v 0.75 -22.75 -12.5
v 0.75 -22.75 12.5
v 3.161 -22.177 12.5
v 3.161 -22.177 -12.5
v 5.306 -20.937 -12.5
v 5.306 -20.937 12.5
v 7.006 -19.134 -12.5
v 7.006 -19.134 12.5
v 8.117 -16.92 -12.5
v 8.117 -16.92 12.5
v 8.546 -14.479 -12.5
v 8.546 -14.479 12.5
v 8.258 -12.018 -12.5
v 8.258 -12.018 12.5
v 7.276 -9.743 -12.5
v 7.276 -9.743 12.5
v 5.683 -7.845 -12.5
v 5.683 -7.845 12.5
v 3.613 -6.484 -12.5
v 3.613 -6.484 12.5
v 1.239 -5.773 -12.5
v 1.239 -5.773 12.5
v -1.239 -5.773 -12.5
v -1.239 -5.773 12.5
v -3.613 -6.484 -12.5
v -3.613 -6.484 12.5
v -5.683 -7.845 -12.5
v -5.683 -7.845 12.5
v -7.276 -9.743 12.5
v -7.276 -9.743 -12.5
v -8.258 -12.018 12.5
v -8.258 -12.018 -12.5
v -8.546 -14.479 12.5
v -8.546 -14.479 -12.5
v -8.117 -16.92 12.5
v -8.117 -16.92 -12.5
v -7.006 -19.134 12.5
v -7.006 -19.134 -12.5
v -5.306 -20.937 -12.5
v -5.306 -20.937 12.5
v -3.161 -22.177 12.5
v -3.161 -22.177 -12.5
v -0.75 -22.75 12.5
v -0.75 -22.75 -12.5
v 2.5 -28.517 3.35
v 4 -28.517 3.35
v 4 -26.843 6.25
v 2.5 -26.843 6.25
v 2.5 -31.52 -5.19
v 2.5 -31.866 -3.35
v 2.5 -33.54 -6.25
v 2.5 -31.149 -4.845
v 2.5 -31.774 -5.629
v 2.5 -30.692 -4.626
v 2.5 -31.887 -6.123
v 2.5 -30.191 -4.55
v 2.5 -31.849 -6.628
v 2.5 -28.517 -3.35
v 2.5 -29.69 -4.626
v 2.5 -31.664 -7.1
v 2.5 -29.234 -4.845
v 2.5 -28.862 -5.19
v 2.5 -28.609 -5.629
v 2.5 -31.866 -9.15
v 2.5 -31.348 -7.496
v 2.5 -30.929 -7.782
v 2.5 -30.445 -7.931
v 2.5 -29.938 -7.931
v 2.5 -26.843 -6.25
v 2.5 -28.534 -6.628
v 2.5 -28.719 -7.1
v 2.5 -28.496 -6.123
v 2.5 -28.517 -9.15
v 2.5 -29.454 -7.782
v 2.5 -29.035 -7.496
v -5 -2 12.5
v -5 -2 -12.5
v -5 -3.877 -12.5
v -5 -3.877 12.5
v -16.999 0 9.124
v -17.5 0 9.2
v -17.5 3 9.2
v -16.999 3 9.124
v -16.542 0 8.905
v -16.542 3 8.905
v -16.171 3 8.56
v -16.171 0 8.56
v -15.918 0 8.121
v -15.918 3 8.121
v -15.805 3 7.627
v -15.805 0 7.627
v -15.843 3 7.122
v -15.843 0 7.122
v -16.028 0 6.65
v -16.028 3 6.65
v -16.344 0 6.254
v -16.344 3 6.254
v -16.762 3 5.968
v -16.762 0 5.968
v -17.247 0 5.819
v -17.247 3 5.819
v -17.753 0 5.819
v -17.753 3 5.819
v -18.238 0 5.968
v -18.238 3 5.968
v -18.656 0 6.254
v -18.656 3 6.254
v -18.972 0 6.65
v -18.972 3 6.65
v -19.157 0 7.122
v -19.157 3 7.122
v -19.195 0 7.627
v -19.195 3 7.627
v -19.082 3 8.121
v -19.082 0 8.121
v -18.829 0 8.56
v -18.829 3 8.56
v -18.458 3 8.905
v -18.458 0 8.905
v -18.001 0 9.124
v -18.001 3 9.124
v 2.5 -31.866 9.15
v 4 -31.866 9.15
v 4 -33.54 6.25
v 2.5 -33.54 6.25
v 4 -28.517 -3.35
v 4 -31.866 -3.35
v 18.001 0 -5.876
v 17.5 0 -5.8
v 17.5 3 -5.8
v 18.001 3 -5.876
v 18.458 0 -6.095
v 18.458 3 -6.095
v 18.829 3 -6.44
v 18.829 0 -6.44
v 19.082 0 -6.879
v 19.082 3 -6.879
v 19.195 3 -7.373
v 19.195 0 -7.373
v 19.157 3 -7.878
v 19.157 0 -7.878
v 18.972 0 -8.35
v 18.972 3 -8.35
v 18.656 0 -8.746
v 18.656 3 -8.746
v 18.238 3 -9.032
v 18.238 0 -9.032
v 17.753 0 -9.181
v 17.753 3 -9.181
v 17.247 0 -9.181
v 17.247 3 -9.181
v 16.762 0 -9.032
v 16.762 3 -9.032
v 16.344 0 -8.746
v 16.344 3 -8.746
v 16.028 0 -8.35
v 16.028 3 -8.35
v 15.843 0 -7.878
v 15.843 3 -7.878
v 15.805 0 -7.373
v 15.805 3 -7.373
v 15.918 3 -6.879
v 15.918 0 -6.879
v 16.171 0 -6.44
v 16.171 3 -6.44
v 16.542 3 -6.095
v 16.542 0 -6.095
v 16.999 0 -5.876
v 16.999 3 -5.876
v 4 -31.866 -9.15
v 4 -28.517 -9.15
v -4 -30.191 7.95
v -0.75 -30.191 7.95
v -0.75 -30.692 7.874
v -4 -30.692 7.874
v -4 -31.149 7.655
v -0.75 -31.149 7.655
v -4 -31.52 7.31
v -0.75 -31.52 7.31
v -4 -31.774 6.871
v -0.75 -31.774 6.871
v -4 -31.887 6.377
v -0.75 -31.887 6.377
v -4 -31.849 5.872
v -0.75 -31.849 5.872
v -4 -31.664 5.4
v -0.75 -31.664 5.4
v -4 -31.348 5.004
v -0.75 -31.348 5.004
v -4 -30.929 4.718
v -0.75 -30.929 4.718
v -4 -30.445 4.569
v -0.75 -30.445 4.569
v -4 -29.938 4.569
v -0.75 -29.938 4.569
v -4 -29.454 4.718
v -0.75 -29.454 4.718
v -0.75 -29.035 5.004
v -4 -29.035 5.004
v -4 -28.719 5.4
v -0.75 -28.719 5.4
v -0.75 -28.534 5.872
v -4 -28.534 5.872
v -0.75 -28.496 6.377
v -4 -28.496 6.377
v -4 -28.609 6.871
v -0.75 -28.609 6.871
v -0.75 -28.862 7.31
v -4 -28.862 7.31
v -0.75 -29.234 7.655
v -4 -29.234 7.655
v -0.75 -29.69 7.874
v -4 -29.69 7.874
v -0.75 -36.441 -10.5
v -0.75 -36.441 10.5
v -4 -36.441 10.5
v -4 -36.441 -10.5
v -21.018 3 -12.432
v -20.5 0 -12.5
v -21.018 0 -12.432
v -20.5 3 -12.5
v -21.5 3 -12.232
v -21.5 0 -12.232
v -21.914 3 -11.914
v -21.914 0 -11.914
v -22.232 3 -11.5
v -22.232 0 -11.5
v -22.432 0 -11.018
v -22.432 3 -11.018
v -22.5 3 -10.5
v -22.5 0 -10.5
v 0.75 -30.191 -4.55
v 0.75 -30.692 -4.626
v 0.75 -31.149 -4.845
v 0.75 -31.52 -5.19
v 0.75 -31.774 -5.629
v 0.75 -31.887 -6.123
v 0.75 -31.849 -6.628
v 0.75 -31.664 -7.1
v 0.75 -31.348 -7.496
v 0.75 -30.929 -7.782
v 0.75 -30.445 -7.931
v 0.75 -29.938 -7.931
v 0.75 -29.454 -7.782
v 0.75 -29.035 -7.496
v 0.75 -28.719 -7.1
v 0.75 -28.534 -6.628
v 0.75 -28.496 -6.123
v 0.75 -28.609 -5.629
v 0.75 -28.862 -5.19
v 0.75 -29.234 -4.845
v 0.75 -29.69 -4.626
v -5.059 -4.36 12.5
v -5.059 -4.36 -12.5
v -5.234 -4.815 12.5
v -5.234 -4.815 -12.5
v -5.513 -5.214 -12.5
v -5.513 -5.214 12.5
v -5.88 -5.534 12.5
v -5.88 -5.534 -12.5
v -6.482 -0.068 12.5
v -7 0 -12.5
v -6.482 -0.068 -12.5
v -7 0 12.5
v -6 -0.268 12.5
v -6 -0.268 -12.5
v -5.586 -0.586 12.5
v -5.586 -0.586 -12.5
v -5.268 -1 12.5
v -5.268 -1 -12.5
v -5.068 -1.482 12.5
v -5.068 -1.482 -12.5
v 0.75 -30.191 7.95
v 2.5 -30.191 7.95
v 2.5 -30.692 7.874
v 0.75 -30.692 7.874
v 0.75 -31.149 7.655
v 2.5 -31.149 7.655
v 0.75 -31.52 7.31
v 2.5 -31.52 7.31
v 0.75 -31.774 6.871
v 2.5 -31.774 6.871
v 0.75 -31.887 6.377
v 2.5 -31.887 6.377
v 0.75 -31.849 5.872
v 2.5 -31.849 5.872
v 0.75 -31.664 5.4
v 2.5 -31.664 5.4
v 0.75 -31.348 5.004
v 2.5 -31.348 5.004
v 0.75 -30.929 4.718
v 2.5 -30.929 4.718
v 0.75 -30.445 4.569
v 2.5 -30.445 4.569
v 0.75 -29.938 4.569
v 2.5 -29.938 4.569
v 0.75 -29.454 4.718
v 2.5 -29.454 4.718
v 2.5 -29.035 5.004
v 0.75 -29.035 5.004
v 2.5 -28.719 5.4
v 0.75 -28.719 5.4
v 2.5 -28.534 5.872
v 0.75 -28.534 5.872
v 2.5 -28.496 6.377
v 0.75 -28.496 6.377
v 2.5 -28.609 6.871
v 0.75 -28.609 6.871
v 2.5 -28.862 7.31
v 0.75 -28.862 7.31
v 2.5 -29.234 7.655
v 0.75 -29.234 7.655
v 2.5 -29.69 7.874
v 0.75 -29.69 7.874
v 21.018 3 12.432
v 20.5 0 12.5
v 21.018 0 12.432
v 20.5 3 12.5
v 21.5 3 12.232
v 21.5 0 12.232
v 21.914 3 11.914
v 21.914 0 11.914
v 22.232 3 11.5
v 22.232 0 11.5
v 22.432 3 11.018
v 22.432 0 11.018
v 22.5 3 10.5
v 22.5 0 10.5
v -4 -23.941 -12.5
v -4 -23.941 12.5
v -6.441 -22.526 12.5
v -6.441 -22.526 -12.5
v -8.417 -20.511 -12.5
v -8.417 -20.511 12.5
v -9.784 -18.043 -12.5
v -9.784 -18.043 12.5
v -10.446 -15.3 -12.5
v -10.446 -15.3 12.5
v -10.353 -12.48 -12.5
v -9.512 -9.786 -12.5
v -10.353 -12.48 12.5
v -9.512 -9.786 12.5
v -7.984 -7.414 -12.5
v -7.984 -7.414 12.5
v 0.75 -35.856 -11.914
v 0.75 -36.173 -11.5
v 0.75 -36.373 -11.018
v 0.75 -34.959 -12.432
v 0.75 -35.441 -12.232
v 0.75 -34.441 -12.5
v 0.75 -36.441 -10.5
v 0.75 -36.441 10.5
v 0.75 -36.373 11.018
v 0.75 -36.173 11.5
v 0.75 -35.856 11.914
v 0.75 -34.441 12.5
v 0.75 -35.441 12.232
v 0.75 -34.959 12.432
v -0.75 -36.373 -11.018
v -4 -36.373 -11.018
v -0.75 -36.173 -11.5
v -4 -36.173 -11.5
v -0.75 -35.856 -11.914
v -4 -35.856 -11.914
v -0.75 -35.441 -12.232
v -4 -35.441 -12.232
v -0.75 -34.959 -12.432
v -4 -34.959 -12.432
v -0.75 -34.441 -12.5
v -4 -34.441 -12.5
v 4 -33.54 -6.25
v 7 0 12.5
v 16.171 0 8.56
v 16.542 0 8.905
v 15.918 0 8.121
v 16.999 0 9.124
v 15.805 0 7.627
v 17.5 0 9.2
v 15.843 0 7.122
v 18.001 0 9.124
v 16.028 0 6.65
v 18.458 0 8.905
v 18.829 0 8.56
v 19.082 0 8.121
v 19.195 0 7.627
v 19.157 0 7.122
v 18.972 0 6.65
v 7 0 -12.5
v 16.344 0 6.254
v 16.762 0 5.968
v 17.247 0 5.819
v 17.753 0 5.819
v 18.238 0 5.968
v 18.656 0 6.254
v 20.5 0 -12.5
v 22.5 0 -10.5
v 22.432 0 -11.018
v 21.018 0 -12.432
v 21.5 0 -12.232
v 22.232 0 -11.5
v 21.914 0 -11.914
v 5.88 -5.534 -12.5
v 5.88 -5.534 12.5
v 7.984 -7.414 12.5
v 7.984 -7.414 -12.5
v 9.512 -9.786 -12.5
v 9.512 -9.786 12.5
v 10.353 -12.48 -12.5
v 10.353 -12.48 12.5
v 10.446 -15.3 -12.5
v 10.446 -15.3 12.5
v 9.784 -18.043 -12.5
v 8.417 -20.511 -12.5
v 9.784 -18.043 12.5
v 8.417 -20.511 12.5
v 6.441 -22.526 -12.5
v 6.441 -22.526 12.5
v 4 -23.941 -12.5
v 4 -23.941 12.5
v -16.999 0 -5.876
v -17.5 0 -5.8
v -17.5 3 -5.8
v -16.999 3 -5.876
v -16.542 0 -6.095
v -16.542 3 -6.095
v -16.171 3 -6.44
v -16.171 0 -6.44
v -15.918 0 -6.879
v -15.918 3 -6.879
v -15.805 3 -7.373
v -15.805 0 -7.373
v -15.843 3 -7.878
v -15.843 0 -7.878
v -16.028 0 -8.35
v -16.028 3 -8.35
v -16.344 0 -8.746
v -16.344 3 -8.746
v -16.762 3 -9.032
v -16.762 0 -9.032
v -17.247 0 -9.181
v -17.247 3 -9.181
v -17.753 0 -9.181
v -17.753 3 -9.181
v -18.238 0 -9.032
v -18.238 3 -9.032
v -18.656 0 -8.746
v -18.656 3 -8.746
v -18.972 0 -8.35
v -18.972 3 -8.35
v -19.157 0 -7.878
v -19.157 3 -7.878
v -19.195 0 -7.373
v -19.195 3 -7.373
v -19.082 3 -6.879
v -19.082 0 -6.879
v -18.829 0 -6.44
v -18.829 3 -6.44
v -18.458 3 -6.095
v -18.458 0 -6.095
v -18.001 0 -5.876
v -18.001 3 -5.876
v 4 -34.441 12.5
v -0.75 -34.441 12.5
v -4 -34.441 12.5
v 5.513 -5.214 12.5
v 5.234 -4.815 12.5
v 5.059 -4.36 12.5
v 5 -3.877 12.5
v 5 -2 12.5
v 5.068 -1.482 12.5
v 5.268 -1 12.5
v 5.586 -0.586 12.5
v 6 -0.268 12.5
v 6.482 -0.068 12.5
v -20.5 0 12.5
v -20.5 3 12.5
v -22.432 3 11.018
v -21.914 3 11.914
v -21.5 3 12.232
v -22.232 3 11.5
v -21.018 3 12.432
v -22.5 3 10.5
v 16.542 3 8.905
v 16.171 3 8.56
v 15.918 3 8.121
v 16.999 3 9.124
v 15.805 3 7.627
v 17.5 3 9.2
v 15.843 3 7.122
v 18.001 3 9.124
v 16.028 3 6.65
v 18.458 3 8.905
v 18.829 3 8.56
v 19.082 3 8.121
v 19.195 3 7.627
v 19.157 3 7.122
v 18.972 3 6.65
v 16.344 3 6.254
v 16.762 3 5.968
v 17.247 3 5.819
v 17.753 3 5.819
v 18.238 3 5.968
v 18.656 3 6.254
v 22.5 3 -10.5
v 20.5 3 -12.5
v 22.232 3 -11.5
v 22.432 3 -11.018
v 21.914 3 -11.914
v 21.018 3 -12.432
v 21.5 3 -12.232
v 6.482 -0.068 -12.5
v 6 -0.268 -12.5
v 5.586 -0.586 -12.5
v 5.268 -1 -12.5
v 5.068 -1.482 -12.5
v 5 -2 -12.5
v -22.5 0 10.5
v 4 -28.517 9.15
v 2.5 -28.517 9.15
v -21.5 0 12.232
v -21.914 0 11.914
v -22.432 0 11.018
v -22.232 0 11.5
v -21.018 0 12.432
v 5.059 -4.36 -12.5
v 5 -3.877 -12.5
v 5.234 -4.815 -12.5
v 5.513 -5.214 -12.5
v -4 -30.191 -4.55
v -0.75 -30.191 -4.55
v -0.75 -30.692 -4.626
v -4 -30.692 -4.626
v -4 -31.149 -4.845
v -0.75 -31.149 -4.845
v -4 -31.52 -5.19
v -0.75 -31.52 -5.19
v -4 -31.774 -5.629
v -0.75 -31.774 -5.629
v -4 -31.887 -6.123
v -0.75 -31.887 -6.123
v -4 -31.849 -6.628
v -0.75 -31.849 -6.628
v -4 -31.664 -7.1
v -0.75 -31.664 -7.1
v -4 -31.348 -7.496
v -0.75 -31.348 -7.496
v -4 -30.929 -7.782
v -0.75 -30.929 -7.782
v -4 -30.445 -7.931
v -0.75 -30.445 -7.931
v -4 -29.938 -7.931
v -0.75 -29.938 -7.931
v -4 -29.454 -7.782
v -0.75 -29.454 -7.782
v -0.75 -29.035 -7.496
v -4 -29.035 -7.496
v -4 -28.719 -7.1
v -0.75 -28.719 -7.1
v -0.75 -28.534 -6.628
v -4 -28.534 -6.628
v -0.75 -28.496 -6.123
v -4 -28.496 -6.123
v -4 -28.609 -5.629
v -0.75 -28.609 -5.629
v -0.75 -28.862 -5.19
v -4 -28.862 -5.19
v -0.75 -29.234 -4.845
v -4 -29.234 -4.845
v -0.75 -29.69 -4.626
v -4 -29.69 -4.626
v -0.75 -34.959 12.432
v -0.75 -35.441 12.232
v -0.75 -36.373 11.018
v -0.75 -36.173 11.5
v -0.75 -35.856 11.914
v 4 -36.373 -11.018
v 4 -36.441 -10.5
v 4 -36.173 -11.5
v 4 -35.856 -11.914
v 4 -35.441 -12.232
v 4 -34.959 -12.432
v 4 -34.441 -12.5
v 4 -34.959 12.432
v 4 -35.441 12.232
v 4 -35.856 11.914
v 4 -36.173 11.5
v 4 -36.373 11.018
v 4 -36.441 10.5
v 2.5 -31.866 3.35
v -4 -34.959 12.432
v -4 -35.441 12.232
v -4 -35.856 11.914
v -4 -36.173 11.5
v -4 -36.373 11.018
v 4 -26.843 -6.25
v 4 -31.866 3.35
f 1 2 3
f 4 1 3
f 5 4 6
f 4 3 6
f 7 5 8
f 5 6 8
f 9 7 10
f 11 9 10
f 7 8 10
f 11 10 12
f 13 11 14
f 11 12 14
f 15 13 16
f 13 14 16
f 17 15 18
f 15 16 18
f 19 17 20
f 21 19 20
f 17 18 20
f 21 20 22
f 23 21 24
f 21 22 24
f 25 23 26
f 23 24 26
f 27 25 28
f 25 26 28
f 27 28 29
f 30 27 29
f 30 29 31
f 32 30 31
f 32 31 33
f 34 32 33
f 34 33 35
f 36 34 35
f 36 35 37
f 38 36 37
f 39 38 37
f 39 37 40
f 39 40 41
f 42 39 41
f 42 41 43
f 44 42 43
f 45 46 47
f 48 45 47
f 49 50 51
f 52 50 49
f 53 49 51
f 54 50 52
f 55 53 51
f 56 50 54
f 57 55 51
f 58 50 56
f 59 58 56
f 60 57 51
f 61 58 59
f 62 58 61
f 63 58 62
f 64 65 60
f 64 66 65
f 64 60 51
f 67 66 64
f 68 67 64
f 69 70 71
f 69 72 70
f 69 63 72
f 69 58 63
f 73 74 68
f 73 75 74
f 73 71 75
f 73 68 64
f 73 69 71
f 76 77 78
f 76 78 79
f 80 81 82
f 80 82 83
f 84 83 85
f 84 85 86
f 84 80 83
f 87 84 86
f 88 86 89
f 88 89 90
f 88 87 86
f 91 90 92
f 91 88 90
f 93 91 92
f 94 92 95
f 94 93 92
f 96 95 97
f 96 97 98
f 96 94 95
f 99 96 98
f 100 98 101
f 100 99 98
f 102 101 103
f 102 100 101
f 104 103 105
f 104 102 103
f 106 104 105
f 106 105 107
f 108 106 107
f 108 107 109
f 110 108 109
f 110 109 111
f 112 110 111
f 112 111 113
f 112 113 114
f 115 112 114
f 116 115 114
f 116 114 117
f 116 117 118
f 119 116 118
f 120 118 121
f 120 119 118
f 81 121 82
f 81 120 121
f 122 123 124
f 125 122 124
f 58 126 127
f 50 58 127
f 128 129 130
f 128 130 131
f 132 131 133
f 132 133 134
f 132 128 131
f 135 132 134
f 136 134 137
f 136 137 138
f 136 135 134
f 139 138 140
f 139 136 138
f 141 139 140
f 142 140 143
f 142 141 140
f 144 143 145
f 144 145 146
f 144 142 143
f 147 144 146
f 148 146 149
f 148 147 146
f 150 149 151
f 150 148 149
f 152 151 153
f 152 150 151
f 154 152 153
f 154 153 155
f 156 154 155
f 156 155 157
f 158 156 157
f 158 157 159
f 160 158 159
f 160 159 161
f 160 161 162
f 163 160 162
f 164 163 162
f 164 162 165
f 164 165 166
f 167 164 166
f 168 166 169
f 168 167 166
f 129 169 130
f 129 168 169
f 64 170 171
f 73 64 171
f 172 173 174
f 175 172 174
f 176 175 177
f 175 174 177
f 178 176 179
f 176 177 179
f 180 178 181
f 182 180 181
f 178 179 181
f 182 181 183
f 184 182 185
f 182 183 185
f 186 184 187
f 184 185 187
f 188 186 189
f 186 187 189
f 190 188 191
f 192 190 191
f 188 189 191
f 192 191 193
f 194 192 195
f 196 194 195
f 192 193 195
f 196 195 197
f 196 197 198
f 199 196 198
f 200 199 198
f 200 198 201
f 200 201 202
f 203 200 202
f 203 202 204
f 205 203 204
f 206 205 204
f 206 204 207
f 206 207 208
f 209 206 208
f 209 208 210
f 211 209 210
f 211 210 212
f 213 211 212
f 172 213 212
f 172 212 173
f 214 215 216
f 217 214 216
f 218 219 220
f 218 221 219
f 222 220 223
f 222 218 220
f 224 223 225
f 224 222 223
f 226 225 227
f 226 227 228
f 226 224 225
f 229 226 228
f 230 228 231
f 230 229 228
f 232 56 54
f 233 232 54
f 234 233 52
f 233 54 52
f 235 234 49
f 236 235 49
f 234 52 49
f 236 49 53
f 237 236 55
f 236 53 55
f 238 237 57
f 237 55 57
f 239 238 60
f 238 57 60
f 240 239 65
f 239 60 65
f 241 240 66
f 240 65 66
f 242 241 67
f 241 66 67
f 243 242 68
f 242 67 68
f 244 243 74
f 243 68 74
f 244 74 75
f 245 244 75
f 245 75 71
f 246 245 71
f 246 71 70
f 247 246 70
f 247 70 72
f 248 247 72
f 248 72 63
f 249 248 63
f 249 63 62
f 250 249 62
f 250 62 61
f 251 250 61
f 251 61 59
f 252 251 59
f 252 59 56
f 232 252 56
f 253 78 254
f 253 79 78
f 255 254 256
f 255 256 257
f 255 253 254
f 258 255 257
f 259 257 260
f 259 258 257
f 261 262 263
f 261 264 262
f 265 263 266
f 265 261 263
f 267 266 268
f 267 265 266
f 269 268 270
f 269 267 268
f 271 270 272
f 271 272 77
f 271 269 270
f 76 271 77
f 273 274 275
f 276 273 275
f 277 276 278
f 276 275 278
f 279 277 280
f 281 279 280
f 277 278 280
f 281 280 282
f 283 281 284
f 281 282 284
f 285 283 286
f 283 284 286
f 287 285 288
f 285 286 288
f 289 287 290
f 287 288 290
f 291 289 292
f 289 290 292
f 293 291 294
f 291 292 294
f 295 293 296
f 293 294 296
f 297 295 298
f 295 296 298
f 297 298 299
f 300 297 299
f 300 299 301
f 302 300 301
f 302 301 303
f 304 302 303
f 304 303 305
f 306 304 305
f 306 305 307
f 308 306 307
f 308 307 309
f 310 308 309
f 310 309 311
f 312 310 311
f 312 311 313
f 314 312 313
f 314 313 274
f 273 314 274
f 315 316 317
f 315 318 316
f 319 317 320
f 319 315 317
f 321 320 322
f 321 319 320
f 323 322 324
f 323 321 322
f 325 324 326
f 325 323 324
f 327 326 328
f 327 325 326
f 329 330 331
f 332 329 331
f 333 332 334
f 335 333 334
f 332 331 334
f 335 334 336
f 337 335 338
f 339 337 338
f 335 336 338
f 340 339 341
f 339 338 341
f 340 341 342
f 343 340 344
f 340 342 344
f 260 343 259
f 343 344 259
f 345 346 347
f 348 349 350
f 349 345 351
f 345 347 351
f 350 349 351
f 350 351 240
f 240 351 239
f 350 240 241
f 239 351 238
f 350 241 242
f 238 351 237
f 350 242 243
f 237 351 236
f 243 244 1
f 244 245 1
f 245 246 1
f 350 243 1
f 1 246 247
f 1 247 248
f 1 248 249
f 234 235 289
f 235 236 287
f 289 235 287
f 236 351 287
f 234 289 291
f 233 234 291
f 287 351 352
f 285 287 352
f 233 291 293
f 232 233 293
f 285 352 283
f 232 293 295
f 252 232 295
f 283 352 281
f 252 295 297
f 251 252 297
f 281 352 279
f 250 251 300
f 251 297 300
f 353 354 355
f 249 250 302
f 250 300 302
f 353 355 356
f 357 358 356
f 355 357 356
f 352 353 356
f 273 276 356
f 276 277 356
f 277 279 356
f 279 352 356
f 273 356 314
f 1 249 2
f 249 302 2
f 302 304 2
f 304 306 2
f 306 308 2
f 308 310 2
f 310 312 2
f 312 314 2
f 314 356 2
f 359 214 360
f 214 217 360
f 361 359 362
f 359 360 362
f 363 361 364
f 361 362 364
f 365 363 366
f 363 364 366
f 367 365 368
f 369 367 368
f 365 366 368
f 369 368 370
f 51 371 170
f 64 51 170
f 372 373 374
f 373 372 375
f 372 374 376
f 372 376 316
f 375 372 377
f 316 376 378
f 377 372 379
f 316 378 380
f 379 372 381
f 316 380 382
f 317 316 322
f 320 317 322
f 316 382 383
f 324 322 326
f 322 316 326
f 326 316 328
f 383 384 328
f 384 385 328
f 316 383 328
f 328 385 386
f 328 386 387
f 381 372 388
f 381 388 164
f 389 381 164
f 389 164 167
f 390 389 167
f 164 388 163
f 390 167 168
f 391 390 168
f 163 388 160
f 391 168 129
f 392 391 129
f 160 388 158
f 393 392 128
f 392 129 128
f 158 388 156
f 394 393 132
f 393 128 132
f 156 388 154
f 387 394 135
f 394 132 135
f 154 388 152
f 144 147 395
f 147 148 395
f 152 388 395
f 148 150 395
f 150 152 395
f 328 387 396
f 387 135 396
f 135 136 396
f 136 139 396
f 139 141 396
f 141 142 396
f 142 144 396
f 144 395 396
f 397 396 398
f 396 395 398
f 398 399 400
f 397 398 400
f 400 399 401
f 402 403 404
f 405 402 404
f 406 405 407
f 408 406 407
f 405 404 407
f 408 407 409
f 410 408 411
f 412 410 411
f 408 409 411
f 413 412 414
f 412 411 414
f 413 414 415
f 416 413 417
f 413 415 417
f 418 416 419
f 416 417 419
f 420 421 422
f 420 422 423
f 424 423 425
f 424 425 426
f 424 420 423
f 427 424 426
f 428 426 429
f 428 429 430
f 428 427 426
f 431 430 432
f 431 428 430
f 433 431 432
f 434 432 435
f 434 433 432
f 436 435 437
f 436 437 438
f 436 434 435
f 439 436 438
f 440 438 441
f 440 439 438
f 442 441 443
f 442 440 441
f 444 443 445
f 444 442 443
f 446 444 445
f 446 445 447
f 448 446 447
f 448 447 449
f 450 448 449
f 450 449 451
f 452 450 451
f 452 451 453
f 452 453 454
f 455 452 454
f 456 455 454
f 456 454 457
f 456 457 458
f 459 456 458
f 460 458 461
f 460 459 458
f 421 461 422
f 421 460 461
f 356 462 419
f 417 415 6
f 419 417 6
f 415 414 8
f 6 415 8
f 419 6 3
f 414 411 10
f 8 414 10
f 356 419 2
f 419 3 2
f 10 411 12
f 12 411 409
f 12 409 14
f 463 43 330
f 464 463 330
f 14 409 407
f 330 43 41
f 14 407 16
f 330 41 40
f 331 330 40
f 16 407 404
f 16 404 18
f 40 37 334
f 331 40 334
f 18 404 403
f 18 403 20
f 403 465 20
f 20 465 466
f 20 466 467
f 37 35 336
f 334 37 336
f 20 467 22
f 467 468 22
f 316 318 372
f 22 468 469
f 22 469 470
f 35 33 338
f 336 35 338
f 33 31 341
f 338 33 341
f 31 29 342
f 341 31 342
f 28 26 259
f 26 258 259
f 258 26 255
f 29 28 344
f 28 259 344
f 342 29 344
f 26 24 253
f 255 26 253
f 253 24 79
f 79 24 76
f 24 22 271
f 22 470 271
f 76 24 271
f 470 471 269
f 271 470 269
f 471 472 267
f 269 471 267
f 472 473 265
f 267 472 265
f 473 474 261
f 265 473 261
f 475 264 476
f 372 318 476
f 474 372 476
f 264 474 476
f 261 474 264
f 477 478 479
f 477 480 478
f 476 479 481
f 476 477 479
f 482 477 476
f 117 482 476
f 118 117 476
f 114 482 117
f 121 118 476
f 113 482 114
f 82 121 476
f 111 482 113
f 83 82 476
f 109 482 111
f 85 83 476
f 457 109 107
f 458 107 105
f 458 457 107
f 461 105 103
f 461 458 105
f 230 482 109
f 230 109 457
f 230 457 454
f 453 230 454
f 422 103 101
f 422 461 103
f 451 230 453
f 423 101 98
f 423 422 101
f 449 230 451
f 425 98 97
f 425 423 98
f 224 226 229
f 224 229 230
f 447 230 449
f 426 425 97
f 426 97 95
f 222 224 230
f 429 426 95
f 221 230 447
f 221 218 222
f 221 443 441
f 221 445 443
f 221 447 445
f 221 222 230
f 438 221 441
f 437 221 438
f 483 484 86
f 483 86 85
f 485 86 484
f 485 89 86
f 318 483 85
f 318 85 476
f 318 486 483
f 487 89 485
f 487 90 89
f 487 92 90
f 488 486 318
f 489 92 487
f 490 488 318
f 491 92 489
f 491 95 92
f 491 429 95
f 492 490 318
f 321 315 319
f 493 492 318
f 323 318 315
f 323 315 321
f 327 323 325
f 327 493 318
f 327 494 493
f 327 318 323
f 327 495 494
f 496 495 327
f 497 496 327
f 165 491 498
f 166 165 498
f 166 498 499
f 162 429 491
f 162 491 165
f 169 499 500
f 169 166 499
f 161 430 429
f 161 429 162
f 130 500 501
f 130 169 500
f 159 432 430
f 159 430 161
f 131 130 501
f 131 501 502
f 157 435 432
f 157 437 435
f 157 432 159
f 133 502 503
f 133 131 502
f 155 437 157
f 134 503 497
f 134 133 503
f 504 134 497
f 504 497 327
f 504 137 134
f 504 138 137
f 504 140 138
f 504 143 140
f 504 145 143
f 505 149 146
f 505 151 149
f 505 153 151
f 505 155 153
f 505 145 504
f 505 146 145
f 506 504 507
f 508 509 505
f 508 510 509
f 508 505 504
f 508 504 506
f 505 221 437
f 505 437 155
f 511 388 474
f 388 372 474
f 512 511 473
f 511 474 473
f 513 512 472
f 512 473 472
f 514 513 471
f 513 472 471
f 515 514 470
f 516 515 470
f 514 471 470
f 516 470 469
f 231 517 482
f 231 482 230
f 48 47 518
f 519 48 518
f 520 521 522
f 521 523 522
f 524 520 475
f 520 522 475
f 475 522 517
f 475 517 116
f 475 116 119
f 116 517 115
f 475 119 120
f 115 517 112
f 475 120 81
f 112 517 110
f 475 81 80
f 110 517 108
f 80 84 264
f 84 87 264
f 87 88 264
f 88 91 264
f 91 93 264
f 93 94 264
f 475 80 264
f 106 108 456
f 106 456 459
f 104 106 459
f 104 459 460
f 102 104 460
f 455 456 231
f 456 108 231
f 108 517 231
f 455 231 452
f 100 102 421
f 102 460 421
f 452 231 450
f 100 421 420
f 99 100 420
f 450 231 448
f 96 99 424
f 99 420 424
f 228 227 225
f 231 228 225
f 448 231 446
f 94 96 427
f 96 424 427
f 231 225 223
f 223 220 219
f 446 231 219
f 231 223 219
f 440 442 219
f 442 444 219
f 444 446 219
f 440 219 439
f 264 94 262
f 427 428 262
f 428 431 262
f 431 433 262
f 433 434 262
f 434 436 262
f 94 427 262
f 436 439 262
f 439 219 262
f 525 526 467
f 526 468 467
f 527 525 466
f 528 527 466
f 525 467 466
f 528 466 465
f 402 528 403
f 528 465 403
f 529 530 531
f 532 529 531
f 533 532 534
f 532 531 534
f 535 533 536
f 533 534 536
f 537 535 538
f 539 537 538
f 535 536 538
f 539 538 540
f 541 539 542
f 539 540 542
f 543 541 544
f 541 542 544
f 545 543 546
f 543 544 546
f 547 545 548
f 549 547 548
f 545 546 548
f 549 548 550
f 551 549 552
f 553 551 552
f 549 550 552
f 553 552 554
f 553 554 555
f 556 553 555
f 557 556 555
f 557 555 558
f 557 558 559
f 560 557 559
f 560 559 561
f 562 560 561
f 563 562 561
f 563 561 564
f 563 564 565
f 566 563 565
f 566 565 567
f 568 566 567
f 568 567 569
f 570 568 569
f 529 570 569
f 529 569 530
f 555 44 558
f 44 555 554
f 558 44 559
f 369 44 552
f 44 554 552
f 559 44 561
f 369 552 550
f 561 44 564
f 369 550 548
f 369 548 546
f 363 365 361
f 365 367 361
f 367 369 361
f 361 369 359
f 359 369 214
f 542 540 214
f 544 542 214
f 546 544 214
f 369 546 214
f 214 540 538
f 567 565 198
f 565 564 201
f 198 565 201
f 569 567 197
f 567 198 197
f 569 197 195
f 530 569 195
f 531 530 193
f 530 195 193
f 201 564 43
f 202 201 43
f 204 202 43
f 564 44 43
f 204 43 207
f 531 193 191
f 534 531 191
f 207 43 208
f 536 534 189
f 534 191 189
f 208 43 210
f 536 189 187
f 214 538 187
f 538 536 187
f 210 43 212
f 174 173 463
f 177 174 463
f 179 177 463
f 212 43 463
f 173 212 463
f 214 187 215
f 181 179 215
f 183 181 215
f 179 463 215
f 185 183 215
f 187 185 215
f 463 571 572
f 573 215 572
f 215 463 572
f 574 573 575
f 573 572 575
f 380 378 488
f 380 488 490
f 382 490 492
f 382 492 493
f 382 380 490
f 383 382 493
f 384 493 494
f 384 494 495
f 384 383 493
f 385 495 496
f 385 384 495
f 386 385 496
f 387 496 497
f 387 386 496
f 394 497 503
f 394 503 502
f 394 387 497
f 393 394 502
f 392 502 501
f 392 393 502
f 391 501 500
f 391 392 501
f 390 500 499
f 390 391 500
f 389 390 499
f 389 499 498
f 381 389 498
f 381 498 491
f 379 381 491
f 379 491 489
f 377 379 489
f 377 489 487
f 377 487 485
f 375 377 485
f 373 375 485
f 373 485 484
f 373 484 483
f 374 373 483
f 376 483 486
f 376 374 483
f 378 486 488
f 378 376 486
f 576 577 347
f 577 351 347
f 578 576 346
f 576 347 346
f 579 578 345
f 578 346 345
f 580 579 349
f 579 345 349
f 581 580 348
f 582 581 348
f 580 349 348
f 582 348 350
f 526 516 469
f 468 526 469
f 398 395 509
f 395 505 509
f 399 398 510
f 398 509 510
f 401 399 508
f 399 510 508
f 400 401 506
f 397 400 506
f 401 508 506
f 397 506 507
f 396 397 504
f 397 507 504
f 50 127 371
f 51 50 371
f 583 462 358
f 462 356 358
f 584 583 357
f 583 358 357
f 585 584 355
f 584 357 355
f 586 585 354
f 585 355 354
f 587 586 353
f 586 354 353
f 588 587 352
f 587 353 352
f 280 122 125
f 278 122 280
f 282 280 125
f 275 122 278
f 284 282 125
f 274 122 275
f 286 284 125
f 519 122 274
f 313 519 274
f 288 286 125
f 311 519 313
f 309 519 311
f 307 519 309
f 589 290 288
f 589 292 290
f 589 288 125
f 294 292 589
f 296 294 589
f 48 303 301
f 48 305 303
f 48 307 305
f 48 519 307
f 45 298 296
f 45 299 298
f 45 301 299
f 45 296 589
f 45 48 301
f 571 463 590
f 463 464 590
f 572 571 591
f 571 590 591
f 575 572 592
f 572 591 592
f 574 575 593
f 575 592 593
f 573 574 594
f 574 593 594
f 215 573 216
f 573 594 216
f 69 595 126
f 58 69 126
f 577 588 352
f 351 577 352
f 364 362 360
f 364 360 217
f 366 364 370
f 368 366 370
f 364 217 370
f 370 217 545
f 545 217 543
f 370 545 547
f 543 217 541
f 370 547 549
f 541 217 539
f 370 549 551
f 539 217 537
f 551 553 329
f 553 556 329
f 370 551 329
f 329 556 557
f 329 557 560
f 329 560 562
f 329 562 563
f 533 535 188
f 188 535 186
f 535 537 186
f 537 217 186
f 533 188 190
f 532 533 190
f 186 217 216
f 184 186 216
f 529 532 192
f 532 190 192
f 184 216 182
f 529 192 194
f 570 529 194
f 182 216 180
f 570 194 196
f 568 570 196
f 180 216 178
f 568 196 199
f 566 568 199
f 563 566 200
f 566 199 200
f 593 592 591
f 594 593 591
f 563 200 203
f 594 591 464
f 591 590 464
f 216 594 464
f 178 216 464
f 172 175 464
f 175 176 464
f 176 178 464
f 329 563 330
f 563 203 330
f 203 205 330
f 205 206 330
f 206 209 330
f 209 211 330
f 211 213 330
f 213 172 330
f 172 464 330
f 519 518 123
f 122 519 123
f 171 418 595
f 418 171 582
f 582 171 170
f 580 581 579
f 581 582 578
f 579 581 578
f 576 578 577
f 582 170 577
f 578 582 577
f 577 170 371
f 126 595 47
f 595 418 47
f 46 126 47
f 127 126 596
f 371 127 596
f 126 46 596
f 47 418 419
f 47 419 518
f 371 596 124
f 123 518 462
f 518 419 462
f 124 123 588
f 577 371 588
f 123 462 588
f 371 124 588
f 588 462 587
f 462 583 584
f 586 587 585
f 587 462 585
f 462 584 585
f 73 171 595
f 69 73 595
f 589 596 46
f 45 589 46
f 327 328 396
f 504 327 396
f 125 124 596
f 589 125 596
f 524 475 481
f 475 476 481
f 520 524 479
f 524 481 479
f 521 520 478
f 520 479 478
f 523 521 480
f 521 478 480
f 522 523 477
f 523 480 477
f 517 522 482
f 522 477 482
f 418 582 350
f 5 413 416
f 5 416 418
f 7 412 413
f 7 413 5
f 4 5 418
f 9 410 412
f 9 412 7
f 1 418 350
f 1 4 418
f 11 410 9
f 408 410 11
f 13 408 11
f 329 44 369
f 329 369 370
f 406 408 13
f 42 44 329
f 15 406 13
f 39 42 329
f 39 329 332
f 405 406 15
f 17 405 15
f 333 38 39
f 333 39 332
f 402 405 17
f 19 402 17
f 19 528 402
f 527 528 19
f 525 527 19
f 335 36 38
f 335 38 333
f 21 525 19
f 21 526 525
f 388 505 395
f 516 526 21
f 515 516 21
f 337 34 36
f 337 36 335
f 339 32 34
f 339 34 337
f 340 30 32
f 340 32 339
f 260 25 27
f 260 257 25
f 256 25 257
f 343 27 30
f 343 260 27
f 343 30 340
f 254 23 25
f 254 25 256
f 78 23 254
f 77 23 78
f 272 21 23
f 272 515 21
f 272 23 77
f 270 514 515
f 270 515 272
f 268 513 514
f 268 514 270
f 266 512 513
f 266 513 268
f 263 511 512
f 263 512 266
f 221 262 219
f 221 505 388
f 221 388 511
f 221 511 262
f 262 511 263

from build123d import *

# Parameters (mm, degrees)
SKETCH1_W           = 45
SKETCH1_H           = 25
SKETCH1_R           = 1.7
BOSS_EXTRUDE1_DEPTH = 3
SKETCH2_W           = 10
SKETCH2_H           = 25
BOSS_EXTRUDE2_DEPTH = 5
BOSS_EXTRUDE3_DEPTH = 25
CUT_EXTRUDE1_DEPTH  = 50.590533486
SKETCH5_R           = 1.7
CUT_EXTRUDE2_DEPTH  = 47.75971569
CUT_EXTRUDE3_DEPTH  = 1.5
FILLET1_R           = 2
FILLET2_R           = 2
FILLET3_R           = 2


with BuildPart() as part:
    # Sketch1 → Boss-Extrude1 (new body)
    with BuildSketch(Plane(origin=(0, 0, 0), x_dir=(1, 0, 0), z_dir=(0, 1, 0))):
        Rectangle(SKETCH1_W, SKETCH1_H)
        with Locations(Location((-17.5, 7.5, 0), (0, 0, 270))):
            Circle(SKETCH1_R, mode=Mode.SUBTRACT)
        with Locations(Location((17.5, 7.5, 0), (0, 0, 270))):
            Circle(SKETCH1_R, mode=Mode.SUBTRACT)
        with Locations(Location((17.5, -7.5, 0), (0, 0, 270))):
            Circle(SKETCH1_R, mode=Mode.SUBTRACT)
        with Locations(Location((-17.5, -7.5, 0), (0, 0, 270))):
            Circle(SKETCH1_R, mode=Mode.SUBTRACT)
    extrude(amount=BOSS_EXTRUDE1_DEPTH)

    # Sketch2 → Boss-Extrude2 (add)
    with BuildSketch(Plane.XZ):
        Rectangle(SKETCH2_W, SKETCH2_H)
    extrude(amount=BOSS_EXTRUDE2_DEPTH)

    # Sketch3 → Boss-Extrude3 (add)
    with BuildSketch(Plane.XY.offset(12.5)):
        with BuildLine():
            Line((4, -23.941336576), (4, -36.441336576))
            Line((4, -36.441336576), (-4, -36.441336576))
            Line((-4, -36.441336576), (-4, -23.941336576))
            ThreePointArc((-4, -23.941336576), (-10.485397361, -14.786664856), (-5, -5))
            Line((-5, -5), (5, -5))
            ThreePointArc((5, -5), (10.485397361, -14.786664856), (4, -23.941336576))
        make_face()
    extrude(amount=-BOSS_EXTRUDE3_DEPTH)

    # Sketch4 → Cut-Extrude1 (cut, through all)
    with BuildSketch(Plane.XY.offset(12.5)):
        with BuildLine():
            Line((-0.75, -22.750134396), (-0.75, -36.441336576))
            Line((-0.75, -36.441336576), (0.75, -36.441336576))
            Line((0.75, -36.441336576), (0.75, -22.750134396))
            ThreePointArc((0.75, -22.750134396), (0, -5.683092656), (-0.75, -22.750134396))
        make_face()
    extrude(amount=-CUT_EXTRUDE1_DEPTH, mode=Mode.SUBTRACT)

    # Sketch5 → Cut-Extrude2 (cut, through all)
    with BuildSketch(Plane(origin=(4, 0, 0), x_dir=(0, 0, -1), z_dir=(1, 0, 0))):
        with Locations(Location((-6.25, -30.191336576, 0), (0, 0, 180))):
            Circle(SKETCH5_R)
        with Locations(Location((6.25, -30.191336576, 0), (0, 0, 180))):
            Circle(SKETCH5_R)
    extrude(amount=-CUT_EXTRUDE2_DEPTH, mode=Mode.SUBTRACT)

    # Sketch6 → Cut-Extrude3 (cut)
    with BuildSketch(Plane(origin=(4, 0, 0), x_dir=(0, 0, -1), z_dir=(1, 0, 0))):
        Polygon((9.15, -28.517020795), (6.25, -26.842705014), (3.35, -28.517020795), (3.35, -31.865652356), (6.25, -33.539968137), (9.15, -31.865652356), align=None)
        Polygon((-3.35, -28.517020795), (-6.25, -26.842705014), (-9.15, -28.517020795), (-9.15, -31.865652356), (-6.25, -33.539968137), (-3.35, -31.865652356), align=None)
    extrude(amount=-CUT_EXTRUDE3_DEPTH, mode=Mode.SUBTRACT)

    # Fillet1
    fillet1_edges = [part.edges().sort_by_distance(p)[0] for p in [
        (-22.5, 1.5, -12.5),
        (22.5, 1.5, -12.5),
        (22.5, 1.5, 12.5),
        (-22.5, 1.5, 12.5),
    ]]
    fillet(fillet1_edges, radius=FILLET1_R)

    # Fillet2
    fillet2_edges = [part.edges().sort_by_distance(p)[0] for p in [
        (-5, 0, 0),
        (5, 0, 0),
        (-5, -5, 0),
        (5, -5, 0),
    ]]
    fillet(fillet2_edges, radius=FILLET2_R)

    # Fillet3
    fillet3_edges = [part.edges().sort_by_distance(p)[0] for p in [
        (-2.375, -36.441336576, 12.5),
        (2.375, -36.441336576, -12.5),
        (-2.375, -36.441336576, -12.5),
        (2.375, -36.441336576, 12.5),
    ]]
    fillet(fillet3_edges, radius=FILLET3_R)


solid = part.part
